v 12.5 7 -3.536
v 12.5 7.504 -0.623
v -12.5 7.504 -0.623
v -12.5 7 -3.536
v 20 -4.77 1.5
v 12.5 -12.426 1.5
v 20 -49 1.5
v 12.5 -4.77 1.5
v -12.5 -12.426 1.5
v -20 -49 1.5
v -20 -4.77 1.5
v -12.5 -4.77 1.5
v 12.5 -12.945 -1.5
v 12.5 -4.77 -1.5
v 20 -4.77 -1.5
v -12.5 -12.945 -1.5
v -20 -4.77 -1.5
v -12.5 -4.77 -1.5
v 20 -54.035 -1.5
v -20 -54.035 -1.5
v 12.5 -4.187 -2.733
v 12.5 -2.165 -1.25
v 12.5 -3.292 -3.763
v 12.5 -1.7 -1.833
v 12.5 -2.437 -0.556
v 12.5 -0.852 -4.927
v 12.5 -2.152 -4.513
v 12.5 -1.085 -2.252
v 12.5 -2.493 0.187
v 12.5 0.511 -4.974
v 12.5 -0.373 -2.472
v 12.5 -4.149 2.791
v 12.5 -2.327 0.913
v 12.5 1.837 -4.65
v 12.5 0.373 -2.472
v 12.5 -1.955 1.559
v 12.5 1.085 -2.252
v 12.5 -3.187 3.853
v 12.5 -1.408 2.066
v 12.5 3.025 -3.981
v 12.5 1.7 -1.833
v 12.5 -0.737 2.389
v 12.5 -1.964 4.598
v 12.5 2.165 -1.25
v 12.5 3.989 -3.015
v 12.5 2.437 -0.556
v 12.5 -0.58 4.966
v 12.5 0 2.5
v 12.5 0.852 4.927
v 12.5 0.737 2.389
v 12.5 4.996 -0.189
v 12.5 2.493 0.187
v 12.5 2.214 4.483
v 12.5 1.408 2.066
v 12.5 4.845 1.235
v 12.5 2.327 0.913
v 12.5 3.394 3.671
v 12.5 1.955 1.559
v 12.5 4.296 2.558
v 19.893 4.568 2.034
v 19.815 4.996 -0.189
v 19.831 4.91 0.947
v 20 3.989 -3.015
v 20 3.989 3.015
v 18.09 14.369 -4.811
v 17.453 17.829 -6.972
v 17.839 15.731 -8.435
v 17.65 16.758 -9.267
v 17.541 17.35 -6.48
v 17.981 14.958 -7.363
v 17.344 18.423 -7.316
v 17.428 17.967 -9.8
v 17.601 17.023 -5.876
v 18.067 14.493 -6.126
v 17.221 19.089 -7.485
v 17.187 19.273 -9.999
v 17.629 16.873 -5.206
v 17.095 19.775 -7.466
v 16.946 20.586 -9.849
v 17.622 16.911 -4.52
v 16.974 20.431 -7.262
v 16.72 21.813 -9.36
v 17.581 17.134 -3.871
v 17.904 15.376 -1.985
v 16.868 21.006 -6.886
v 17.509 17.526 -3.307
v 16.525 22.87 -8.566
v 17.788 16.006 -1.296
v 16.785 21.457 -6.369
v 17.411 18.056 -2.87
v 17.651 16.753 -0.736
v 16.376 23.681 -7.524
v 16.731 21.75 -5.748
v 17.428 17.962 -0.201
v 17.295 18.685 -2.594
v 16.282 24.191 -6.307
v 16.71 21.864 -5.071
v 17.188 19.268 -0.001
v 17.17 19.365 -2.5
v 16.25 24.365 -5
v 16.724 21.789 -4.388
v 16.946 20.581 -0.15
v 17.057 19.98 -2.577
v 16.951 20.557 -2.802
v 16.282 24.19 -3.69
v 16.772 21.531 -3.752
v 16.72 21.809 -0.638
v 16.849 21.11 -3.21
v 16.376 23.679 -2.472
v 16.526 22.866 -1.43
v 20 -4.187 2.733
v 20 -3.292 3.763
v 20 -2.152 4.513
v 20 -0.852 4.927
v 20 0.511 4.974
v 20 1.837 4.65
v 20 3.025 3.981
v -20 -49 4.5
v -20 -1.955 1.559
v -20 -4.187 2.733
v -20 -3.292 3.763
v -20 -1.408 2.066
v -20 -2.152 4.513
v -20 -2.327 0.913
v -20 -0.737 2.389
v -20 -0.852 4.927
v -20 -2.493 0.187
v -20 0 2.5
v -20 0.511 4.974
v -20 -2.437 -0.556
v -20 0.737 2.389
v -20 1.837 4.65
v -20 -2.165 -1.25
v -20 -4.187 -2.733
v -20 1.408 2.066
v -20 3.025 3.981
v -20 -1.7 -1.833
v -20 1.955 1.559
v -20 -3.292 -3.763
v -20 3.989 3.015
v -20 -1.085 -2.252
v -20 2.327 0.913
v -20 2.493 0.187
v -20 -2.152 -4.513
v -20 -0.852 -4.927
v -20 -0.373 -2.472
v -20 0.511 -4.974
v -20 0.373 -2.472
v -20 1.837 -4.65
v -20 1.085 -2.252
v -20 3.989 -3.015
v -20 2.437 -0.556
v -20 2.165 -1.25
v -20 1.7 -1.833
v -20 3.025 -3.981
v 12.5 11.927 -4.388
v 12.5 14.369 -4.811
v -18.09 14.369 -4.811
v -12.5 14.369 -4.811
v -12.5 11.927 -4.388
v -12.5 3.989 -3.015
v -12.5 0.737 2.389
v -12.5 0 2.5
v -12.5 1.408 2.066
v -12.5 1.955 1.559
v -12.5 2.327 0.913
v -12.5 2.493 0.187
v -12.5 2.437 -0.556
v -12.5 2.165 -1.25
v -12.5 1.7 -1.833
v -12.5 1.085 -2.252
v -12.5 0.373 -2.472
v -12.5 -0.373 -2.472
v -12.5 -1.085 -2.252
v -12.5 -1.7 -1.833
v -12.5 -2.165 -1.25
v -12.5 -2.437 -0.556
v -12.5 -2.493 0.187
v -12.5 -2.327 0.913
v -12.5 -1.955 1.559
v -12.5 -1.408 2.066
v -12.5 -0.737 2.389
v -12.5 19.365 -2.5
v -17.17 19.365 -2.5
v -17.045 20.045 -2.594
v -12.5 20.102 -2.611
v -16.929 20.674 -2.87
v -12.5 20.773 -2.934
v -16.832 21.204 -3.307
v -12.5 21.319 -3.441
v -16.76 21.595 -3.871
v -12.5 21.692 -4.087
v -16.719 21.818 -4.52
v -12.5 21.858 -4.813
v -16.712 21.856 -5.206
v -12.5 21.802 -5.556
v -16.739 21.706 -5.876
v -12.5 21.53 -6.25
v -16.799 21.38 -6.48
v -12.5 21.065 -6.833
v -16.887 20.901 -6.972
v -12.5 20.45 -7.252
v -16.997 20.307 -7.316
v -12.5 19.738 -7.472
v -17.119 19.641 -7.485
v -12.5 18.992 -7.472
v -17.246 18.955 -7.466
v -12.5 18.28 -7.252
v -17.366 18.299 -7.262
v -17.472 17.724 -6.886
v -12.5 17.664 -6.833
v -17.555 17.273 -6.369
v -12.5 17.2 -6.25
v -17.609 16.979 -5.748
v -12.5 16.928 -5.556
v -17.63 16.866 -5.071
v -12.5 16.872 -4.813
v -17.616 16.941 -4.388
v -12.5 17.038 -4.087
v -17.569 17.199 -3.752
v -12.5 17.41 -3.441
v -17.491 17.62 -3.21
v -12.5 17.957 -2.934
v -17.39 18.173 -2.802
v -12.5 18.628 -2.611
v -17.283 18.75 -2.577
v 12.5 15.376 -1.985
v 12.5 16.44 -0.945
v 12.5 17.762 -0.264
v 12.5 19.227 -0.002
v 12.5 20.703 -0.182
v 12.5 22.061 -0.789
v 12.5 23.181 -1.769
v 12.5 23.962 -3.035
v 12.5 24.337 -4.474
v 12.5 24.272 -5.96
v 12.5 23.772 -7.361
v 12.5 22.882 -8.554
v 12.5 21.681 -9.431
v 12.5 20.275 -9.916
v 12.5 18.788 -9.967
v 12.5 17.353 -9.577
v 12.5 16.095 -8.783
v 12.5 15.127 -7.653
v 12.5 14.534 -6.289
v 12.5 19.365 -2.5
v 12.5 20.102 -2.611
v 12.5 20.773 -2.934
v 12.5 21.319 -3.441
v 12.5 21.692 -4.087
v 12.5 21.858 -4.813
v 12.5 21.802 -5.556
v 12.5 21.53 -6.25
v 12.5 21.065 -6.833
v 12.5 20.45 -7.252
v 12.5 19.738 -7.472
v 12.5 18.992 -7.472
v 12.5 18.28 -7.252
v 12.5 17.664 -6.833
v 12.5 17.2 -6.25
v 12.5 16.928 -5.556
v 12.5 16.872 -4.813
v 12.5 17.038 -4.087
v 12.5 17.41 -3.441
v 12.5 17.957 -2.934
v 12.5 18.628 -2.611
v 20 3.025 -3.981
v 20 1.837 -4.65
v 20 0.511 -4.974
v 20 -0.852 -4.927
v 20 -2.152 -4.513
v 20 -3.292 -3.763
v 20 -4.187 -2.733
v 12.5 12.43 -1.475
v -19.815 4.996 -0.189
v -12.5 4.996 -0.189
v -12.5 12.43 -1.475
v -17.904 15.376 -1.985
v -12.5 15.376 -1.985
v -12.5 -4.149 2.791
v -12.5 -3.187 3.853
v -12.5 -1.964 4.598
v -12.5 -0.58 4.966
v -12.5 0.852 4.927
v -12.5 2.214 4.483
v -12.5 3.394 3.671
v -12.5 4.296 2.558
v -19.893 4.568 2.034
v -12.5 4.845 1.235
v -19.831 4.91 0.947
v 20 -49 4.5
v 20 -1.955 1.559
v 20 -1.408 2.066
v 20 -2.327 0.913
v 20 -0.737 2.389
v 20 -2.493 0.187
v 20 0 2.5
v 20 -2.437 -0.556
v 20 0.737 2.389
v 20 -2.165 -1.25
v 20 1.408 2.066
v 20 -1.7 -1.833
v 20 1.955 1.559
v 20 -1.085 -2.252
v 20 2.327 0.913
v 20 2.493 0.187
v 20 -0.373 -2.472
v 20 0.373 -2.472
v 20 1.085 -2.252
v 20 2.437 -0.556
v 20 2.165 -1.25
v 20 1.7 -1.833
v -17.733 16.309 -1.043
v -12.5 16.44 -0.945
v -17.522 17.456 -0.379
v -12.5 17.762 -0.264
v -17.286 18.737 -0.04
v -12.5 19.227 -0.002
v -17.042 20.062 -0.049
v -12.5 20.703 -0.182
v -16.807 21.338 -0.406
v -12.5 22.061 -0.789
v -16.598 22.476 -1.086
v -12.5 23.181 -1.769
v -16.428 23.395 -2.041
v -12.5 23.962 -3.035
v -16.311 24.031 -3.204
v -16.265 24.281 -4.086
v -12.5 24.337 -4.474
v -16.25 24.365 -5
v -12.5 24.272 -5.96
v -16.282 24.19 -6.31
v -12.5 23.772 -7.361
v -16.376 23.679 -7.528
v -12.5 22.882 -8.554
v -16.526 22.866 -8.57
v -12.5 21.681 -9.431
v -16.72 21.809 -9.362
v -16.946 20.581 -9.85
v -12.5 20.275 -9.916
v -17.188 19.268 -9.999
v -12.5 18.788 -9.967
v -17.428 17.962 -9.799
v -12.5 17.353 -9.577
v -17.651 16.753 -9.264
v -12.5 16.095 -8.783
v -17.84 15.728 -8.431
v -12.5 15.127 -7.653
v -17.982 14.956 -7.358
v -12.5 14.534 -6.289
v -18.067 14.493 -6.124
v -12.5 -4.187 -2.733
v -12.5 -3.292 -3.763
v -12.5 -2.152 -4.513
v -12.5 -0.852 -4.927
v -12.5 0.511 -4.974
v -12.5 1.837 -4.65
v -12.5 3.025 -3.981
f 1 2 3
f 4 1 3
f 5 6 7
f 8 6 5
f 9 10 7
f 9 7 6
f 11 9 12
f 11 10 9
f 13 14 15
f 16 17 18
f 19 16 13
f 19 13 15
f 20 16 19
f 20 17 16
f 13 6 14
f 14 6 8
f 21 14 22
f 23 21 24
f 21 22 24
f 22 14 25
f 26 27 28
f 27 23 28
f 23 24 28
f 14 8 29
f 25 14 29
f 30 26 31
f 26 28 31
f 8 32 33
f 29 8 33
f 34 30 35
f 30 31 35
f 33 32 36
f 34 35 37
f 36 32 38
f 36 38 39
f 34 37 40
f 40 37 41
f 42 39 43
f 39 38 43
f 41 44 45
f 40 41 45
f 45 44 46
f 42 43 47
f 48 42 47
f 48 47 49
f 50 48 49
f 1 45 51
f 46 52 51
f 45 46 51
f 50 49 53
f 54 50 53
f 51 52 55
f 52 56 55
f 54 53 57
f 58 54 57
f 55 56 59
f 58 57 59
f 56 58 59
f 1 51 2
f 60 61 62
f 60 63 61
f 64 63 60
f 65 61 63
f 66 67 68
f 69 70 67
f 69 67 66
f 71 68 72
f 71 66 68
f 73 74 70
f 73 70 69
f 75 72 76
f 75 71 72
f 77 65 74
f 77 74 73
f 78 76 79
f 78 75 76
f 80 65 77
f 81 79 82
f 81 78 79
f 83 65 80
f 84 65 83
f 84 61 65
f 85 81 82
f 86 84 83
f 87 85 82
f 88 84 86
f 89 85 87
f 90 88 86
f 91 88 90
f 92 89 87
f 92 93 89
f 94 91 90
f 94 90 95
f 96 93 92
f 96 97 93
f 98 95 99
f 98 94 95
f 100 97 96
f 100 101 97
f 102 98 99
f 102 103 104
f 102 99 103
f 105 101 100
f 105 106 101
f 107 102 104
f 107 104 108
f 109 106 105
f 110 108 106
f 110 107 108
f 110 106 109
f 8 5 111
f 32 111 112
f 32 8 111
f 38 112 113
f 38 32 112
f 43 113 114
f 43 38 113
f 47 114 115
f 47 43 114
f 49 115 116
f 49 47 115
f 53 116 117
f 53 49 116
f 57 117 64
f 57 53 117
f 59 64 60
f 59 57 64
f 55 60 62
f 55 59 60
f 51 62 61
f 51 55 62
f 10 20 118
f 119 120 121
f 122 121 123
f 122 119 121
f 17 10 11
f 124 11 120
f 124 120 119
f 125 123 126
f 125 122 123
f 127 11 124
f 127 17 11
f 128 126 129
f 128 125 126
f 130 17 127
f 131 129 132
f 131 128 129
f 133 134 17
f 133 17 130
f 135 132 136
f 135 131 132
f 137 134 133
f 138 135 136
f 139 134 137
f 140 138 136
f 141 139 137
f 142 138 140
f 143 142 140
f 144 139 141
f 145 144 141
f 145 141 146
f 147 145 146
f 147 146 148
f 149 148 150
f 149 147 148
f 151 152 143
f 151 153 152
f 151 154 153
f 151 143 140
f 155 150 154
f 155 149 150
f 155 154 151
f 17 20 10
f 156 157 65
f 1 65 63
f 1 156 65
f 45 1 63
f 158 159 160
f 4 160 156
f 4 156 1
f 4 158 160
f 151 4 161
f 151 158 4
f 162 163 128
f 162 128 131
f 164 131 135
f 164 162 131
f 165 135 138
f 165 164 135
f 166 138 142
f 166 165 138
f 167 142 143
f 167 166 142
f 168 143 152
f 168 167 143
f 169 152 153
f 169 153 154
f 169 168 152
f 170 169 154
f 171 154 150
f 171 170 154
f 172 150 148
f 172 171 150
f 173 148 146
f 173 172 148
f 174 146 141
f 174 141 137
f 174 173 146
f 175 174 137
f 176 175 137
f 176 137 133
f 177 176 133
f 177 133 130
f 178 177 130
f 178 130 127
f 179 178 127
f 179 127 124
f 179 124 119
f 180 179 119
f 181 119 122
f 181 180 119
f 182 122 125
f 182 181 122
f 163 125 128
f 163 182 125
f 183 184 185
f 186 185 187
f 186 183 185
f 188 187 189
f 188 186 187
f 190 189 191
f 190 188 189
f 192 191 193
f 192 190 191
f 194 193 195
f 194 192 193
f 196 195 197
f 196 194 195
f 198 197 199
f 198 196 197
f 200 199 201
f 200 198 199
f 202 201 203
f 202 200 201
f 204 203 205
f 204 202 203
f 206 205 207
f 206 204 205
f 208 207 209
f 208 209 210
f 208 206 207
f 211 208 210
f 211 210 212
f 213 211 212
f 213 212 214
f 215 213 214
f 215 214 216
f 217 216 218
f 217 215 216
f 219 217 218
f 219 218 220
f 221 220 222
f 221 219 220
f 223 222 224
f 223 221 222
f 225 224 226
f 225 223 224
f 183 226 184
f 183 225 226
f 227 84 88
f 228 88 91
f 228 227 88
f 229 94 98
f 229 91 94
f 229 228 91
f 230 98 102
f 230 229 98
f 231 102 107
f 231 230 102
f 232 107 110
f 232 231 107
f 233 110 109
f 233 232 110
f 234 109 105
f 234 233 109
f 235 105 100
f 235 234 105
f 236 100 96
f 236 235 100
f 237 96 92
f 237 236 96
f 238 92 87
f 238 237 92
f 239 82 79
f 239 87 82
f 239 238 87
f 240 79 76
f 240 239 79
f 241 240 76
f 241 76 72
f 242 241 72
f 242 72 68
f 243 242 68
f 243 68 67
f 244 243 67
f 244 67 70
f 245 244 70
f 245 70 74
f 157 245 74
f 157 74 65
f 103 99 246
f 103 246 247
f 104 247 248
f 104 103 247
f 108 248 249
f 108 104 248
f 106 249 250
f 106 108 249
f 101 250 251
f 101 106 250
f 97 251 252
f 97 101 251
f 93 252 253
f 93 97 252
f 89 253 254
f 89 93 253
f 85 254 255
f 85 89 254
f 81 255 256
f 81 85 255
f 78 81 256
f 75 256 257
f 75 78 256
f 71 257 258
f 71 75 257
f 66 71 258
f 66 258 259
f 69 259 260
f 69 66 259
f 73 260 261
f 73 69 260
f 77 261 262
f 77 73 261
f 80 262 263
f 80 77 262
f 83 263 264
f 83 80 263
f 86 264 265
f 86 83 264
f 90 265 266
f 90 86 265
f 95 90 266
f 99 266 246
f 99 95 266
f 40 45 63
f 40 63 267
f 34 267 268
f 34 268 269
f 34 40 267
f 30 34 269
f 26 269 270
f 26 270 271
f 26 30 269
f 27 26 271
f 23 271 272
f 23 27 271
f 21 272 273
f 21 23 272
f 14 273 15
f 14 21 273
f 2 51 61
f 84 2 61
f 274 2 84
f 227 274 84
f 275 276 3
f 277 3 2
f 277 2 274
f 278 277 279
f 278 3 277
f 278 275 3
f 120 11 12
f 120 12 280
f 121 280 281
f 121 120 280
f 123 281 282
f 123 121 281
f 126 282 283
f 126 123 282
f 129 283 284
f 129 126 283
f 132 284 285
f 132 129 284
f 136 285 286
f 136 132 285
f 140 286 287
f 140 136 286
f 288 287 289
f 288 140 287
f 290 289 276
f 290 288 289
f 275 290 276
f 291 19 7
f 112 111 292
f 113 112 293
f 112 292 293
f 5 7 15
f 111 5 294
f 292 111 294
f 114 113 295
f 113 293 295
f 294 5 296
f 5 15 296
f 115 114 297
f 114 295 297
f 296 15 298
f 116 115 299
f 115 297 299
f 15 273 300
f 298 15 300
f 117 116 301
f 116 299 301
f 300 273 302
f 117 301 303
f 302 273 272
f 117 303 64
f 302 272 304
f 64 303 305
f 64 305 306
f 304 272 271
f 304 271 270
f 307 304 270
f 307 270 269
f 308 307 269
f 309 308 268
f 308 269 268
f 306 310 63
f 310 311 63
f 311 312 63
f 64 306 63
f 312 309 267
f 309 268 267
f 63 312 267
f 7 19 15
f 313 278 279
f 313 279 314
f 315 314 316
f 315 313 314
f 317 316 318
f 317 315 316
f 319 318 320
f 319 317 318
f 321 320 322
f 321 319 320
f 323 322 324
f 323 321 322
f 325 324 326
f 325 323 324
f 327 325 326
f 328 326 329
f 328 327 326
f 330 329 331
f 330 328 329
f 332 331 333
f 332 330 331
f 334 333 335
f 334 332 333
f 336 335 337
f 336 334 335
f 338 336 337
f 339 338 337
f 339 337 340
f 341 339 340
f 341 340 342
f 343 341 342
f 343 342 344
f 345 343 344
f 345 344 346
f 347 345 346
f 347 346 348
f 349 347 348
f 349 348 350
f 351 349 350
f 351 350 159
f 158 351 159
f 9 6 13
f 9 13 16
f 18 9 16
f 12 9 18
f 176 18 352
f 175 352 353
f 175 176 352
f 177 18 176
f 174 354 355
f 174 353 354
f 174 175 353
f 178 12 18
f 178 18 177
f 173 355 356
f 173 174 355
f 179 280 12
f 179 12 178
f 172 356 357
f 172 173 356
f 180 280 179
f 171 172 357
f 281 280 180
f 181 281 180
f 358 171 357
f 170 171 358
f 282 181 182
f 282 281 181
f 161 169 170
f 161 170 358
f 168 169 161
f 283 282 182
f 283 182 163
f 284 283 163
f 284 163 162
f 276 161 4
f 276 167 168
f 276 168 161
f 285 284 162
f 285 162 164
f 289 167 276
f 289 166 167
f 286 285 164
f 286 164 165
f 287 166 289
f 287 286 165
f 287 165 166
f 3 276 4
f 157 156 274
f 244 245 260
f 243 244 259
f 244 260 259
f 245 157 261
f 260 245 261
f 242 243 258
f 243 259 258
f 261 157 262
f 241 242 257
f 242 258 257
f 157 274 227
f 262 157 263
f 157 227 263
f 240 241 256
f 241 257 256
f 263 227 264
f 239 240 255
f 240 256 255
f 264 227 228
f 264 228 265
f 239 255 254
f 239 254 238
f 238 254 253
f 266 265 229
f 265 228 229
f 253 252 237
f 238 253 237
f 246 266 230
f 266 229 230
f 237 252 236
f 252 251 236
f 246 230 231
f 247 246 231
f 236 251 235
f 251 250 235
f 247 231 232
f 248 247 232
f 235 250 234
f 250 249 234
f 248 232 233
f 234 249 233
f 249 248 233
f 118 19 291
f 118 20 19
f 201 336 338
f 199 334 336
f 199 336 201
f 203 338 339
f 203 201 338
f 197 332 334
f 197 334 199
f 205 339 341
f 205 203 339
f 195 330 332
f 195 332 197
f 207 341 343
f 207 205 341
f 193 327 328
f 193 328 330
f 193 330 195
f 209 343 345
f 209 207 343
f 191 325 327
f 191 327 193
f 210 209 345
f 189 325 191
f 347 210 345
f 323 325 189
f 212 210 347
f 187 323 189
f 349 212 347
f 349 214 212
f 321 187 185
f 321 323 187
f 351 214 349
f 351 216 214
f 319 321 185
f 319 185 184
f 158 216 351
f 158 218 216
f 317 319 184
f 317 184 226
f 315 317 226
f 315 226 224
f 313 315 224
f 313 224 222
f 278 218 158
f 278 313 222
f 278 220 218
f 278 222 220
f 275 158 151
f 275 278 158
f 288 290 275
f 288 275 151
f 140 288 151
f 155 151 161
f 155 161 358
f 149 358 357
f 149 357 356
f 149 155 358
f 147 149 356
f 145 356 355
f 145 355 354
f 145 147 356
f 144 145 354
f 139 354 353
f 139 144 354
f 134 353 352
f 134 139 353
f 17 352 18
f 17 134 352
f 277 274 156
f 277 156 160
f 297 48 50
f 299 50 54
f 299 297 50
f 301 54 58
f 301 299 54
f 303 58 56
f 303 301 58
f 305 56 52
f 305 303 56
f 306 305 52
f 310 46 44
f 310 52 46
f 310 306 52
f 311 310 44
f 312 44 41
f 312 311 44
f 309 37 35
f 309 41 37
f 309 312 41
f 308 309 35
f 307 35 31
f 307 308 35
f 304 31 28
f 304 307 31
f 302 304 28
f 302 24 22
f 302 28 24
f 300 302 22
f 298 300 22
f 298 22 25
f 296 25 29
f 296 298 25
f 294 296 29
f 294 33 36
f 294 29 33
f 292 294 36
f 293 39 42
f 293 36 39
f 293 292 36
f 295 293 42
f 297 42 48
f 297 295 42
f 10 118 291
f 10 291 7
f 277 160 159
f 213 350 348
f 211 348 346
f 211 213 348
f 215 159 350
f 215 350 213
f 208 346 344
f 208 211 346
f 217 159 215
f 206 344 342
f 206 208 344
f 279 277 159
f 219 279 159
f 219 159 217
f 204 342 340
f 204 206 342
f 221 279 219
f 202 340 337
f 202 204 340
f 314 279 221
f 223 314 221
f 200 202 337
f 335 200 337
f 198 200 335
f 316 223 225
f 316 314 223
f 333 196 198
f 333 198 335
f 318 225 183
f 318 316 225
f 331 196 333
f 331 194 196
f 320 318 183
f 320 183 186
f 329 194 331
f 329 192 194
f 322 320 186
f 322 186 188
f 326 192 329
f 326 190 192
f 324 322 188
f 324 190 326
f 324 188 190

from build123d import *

# Parameters (mm, degrees)
SKETCH1_R               = 2.5
BOSS_EXTRUDE1_DEPTH     = 20
CUT_EXTRUDE1_DEPTH      = 58.772252315
CUT_EXTRUDE1_DEPTH_BACK = 58.772252315
SKETCH2_W               = 25
SKETCH2_H               = 20
CUT_EXTRUDE2_DEPTH      = 58.772252315
CUT_EXTRUDE2_DEPTH_BACK = 58.772252315
SKETCH3_W               = 25
SKETCH3_H               = 12.433791975
CUT_EXTRUDE4_DEPTH      = 59.240774016
CUT_EXTRUDE4_DEPTH_BACK = 59.240774016


with BuildPart() as part:
    # Sketch1 → Boss-Extrude1 (new, symmetric)
    with BuildSketch(Plane(origin=(0, 0, 0), x_dir=(0, 1, 0), z_dir=(-1, 0, 0))):
        with BuildLine():
            Line((-54.034597787, 1.5), (-49, -4.5))
            Line((-49, -4.5), (-49, -1.5))
            Line((-49, -1.5), (-4.769696007, -1.5))
            ThreePointArc((-4.769696007, -1.5), (0.852265487, -4.926828954), (4.996412, 0.18938619))
            Line((4.996412, 0.18938619), (15.376256638, 1.98493936))
            ThreePointArc((15.376256638, 1.98493936), (24.074374147, 6.679586511), (14.368504731, 4.81061381))
            Line((14.368504731, 4.81061381), (3.988660093, 3.01506064))
            ThreePointArc((3.988660093, 3.01506064), (-0.852265487, 4.926828954), (-4.769696007, 1.5))
            Line((-4.769696007, 1.5), (-54.034597787, 1.5))
        make_face()
        with Locations(Location((0, 0, 0), (0, 0, 270))):
            Circle(SKETCH1_R, mode=Mode.SUBTRACT)
        with Locations(Location((19.364916731, 5, 0), (0, 0, 270))):
            Circle(SKETCH1_R, mode=Mode.SUBTRACT)
    extrude(amount=BOSS_EXTRUDE1_DEPTH, both=True)

    # Sketch2 → Cut-Extrude1 (cut, two sides: drawn at the far end of the back side and taken through both)
    with BuildSketch(Plane(origin=(0, -0.390517957, -2.25753032), x_dir=(-1, 0, 0), z_dir=(0, -0.17045309739797798, -0.9853657907535838)).offset(-CUT_EXTRUDE1_DEPTH_BACK)):
        with Locations((0, -2.5)):
            Rectangle(SKETCH2_W, SKETCH2_H)
    extrude(amount=CUT_EXTRUDE1_DEPTH + CUT_EXTRUDE1_DEPTH_BACK, mode=Mode.SUBTRACT)

    # Sketch3 → Cut-Extrude2 (cut, two sides: drawn at the far end of the back side and taken through both)
    with BuildSketch(Plane(origin=(0, -0.390517957, -2.25753032), x_dir=(-1, 0, 0), z_dir=(0, -0.17045309739797798, -0.9853657907535838)).offset(-CUT_EXTRUDE2_DEPTH_BACK)):
        with Locations((0, 18.716895988)):
            Rectangle(SKETCH3_W, SKETCH3_H)
    extrude(amount=CUT_EXTRUDE2_DEPTH + CUT_EXTRUDE2_DEPTH_BACK, mode=Mode.SUBTRACT)

    # Sketch4 → Cut-Extrude4 (cut, two sides: drawn at the far end of the back side and taken through both)
    with BuildSketch(Plane(origin=(0, 0, -1.5), x_dir=(-1, 0, 0), z_dir=(0, 0, -1)).offset(-CUT_EXTRUDE4_DEPTH_BACK)):
        Polygon((-20, 3.988660093), (-16.25, 24.364916731), (-20, 24.364916731), align=None)
        Polygon((20, 3.988660093), (20, 24.364916731), (16.25, 24.364916731), align=None)
    extrude(amount=CUT_EXTRUDE4_DEPTH + CUT_EXTRUDE4_DEPTH_BACK, mode=Mode.SUBTRACT)


solid = part.part
